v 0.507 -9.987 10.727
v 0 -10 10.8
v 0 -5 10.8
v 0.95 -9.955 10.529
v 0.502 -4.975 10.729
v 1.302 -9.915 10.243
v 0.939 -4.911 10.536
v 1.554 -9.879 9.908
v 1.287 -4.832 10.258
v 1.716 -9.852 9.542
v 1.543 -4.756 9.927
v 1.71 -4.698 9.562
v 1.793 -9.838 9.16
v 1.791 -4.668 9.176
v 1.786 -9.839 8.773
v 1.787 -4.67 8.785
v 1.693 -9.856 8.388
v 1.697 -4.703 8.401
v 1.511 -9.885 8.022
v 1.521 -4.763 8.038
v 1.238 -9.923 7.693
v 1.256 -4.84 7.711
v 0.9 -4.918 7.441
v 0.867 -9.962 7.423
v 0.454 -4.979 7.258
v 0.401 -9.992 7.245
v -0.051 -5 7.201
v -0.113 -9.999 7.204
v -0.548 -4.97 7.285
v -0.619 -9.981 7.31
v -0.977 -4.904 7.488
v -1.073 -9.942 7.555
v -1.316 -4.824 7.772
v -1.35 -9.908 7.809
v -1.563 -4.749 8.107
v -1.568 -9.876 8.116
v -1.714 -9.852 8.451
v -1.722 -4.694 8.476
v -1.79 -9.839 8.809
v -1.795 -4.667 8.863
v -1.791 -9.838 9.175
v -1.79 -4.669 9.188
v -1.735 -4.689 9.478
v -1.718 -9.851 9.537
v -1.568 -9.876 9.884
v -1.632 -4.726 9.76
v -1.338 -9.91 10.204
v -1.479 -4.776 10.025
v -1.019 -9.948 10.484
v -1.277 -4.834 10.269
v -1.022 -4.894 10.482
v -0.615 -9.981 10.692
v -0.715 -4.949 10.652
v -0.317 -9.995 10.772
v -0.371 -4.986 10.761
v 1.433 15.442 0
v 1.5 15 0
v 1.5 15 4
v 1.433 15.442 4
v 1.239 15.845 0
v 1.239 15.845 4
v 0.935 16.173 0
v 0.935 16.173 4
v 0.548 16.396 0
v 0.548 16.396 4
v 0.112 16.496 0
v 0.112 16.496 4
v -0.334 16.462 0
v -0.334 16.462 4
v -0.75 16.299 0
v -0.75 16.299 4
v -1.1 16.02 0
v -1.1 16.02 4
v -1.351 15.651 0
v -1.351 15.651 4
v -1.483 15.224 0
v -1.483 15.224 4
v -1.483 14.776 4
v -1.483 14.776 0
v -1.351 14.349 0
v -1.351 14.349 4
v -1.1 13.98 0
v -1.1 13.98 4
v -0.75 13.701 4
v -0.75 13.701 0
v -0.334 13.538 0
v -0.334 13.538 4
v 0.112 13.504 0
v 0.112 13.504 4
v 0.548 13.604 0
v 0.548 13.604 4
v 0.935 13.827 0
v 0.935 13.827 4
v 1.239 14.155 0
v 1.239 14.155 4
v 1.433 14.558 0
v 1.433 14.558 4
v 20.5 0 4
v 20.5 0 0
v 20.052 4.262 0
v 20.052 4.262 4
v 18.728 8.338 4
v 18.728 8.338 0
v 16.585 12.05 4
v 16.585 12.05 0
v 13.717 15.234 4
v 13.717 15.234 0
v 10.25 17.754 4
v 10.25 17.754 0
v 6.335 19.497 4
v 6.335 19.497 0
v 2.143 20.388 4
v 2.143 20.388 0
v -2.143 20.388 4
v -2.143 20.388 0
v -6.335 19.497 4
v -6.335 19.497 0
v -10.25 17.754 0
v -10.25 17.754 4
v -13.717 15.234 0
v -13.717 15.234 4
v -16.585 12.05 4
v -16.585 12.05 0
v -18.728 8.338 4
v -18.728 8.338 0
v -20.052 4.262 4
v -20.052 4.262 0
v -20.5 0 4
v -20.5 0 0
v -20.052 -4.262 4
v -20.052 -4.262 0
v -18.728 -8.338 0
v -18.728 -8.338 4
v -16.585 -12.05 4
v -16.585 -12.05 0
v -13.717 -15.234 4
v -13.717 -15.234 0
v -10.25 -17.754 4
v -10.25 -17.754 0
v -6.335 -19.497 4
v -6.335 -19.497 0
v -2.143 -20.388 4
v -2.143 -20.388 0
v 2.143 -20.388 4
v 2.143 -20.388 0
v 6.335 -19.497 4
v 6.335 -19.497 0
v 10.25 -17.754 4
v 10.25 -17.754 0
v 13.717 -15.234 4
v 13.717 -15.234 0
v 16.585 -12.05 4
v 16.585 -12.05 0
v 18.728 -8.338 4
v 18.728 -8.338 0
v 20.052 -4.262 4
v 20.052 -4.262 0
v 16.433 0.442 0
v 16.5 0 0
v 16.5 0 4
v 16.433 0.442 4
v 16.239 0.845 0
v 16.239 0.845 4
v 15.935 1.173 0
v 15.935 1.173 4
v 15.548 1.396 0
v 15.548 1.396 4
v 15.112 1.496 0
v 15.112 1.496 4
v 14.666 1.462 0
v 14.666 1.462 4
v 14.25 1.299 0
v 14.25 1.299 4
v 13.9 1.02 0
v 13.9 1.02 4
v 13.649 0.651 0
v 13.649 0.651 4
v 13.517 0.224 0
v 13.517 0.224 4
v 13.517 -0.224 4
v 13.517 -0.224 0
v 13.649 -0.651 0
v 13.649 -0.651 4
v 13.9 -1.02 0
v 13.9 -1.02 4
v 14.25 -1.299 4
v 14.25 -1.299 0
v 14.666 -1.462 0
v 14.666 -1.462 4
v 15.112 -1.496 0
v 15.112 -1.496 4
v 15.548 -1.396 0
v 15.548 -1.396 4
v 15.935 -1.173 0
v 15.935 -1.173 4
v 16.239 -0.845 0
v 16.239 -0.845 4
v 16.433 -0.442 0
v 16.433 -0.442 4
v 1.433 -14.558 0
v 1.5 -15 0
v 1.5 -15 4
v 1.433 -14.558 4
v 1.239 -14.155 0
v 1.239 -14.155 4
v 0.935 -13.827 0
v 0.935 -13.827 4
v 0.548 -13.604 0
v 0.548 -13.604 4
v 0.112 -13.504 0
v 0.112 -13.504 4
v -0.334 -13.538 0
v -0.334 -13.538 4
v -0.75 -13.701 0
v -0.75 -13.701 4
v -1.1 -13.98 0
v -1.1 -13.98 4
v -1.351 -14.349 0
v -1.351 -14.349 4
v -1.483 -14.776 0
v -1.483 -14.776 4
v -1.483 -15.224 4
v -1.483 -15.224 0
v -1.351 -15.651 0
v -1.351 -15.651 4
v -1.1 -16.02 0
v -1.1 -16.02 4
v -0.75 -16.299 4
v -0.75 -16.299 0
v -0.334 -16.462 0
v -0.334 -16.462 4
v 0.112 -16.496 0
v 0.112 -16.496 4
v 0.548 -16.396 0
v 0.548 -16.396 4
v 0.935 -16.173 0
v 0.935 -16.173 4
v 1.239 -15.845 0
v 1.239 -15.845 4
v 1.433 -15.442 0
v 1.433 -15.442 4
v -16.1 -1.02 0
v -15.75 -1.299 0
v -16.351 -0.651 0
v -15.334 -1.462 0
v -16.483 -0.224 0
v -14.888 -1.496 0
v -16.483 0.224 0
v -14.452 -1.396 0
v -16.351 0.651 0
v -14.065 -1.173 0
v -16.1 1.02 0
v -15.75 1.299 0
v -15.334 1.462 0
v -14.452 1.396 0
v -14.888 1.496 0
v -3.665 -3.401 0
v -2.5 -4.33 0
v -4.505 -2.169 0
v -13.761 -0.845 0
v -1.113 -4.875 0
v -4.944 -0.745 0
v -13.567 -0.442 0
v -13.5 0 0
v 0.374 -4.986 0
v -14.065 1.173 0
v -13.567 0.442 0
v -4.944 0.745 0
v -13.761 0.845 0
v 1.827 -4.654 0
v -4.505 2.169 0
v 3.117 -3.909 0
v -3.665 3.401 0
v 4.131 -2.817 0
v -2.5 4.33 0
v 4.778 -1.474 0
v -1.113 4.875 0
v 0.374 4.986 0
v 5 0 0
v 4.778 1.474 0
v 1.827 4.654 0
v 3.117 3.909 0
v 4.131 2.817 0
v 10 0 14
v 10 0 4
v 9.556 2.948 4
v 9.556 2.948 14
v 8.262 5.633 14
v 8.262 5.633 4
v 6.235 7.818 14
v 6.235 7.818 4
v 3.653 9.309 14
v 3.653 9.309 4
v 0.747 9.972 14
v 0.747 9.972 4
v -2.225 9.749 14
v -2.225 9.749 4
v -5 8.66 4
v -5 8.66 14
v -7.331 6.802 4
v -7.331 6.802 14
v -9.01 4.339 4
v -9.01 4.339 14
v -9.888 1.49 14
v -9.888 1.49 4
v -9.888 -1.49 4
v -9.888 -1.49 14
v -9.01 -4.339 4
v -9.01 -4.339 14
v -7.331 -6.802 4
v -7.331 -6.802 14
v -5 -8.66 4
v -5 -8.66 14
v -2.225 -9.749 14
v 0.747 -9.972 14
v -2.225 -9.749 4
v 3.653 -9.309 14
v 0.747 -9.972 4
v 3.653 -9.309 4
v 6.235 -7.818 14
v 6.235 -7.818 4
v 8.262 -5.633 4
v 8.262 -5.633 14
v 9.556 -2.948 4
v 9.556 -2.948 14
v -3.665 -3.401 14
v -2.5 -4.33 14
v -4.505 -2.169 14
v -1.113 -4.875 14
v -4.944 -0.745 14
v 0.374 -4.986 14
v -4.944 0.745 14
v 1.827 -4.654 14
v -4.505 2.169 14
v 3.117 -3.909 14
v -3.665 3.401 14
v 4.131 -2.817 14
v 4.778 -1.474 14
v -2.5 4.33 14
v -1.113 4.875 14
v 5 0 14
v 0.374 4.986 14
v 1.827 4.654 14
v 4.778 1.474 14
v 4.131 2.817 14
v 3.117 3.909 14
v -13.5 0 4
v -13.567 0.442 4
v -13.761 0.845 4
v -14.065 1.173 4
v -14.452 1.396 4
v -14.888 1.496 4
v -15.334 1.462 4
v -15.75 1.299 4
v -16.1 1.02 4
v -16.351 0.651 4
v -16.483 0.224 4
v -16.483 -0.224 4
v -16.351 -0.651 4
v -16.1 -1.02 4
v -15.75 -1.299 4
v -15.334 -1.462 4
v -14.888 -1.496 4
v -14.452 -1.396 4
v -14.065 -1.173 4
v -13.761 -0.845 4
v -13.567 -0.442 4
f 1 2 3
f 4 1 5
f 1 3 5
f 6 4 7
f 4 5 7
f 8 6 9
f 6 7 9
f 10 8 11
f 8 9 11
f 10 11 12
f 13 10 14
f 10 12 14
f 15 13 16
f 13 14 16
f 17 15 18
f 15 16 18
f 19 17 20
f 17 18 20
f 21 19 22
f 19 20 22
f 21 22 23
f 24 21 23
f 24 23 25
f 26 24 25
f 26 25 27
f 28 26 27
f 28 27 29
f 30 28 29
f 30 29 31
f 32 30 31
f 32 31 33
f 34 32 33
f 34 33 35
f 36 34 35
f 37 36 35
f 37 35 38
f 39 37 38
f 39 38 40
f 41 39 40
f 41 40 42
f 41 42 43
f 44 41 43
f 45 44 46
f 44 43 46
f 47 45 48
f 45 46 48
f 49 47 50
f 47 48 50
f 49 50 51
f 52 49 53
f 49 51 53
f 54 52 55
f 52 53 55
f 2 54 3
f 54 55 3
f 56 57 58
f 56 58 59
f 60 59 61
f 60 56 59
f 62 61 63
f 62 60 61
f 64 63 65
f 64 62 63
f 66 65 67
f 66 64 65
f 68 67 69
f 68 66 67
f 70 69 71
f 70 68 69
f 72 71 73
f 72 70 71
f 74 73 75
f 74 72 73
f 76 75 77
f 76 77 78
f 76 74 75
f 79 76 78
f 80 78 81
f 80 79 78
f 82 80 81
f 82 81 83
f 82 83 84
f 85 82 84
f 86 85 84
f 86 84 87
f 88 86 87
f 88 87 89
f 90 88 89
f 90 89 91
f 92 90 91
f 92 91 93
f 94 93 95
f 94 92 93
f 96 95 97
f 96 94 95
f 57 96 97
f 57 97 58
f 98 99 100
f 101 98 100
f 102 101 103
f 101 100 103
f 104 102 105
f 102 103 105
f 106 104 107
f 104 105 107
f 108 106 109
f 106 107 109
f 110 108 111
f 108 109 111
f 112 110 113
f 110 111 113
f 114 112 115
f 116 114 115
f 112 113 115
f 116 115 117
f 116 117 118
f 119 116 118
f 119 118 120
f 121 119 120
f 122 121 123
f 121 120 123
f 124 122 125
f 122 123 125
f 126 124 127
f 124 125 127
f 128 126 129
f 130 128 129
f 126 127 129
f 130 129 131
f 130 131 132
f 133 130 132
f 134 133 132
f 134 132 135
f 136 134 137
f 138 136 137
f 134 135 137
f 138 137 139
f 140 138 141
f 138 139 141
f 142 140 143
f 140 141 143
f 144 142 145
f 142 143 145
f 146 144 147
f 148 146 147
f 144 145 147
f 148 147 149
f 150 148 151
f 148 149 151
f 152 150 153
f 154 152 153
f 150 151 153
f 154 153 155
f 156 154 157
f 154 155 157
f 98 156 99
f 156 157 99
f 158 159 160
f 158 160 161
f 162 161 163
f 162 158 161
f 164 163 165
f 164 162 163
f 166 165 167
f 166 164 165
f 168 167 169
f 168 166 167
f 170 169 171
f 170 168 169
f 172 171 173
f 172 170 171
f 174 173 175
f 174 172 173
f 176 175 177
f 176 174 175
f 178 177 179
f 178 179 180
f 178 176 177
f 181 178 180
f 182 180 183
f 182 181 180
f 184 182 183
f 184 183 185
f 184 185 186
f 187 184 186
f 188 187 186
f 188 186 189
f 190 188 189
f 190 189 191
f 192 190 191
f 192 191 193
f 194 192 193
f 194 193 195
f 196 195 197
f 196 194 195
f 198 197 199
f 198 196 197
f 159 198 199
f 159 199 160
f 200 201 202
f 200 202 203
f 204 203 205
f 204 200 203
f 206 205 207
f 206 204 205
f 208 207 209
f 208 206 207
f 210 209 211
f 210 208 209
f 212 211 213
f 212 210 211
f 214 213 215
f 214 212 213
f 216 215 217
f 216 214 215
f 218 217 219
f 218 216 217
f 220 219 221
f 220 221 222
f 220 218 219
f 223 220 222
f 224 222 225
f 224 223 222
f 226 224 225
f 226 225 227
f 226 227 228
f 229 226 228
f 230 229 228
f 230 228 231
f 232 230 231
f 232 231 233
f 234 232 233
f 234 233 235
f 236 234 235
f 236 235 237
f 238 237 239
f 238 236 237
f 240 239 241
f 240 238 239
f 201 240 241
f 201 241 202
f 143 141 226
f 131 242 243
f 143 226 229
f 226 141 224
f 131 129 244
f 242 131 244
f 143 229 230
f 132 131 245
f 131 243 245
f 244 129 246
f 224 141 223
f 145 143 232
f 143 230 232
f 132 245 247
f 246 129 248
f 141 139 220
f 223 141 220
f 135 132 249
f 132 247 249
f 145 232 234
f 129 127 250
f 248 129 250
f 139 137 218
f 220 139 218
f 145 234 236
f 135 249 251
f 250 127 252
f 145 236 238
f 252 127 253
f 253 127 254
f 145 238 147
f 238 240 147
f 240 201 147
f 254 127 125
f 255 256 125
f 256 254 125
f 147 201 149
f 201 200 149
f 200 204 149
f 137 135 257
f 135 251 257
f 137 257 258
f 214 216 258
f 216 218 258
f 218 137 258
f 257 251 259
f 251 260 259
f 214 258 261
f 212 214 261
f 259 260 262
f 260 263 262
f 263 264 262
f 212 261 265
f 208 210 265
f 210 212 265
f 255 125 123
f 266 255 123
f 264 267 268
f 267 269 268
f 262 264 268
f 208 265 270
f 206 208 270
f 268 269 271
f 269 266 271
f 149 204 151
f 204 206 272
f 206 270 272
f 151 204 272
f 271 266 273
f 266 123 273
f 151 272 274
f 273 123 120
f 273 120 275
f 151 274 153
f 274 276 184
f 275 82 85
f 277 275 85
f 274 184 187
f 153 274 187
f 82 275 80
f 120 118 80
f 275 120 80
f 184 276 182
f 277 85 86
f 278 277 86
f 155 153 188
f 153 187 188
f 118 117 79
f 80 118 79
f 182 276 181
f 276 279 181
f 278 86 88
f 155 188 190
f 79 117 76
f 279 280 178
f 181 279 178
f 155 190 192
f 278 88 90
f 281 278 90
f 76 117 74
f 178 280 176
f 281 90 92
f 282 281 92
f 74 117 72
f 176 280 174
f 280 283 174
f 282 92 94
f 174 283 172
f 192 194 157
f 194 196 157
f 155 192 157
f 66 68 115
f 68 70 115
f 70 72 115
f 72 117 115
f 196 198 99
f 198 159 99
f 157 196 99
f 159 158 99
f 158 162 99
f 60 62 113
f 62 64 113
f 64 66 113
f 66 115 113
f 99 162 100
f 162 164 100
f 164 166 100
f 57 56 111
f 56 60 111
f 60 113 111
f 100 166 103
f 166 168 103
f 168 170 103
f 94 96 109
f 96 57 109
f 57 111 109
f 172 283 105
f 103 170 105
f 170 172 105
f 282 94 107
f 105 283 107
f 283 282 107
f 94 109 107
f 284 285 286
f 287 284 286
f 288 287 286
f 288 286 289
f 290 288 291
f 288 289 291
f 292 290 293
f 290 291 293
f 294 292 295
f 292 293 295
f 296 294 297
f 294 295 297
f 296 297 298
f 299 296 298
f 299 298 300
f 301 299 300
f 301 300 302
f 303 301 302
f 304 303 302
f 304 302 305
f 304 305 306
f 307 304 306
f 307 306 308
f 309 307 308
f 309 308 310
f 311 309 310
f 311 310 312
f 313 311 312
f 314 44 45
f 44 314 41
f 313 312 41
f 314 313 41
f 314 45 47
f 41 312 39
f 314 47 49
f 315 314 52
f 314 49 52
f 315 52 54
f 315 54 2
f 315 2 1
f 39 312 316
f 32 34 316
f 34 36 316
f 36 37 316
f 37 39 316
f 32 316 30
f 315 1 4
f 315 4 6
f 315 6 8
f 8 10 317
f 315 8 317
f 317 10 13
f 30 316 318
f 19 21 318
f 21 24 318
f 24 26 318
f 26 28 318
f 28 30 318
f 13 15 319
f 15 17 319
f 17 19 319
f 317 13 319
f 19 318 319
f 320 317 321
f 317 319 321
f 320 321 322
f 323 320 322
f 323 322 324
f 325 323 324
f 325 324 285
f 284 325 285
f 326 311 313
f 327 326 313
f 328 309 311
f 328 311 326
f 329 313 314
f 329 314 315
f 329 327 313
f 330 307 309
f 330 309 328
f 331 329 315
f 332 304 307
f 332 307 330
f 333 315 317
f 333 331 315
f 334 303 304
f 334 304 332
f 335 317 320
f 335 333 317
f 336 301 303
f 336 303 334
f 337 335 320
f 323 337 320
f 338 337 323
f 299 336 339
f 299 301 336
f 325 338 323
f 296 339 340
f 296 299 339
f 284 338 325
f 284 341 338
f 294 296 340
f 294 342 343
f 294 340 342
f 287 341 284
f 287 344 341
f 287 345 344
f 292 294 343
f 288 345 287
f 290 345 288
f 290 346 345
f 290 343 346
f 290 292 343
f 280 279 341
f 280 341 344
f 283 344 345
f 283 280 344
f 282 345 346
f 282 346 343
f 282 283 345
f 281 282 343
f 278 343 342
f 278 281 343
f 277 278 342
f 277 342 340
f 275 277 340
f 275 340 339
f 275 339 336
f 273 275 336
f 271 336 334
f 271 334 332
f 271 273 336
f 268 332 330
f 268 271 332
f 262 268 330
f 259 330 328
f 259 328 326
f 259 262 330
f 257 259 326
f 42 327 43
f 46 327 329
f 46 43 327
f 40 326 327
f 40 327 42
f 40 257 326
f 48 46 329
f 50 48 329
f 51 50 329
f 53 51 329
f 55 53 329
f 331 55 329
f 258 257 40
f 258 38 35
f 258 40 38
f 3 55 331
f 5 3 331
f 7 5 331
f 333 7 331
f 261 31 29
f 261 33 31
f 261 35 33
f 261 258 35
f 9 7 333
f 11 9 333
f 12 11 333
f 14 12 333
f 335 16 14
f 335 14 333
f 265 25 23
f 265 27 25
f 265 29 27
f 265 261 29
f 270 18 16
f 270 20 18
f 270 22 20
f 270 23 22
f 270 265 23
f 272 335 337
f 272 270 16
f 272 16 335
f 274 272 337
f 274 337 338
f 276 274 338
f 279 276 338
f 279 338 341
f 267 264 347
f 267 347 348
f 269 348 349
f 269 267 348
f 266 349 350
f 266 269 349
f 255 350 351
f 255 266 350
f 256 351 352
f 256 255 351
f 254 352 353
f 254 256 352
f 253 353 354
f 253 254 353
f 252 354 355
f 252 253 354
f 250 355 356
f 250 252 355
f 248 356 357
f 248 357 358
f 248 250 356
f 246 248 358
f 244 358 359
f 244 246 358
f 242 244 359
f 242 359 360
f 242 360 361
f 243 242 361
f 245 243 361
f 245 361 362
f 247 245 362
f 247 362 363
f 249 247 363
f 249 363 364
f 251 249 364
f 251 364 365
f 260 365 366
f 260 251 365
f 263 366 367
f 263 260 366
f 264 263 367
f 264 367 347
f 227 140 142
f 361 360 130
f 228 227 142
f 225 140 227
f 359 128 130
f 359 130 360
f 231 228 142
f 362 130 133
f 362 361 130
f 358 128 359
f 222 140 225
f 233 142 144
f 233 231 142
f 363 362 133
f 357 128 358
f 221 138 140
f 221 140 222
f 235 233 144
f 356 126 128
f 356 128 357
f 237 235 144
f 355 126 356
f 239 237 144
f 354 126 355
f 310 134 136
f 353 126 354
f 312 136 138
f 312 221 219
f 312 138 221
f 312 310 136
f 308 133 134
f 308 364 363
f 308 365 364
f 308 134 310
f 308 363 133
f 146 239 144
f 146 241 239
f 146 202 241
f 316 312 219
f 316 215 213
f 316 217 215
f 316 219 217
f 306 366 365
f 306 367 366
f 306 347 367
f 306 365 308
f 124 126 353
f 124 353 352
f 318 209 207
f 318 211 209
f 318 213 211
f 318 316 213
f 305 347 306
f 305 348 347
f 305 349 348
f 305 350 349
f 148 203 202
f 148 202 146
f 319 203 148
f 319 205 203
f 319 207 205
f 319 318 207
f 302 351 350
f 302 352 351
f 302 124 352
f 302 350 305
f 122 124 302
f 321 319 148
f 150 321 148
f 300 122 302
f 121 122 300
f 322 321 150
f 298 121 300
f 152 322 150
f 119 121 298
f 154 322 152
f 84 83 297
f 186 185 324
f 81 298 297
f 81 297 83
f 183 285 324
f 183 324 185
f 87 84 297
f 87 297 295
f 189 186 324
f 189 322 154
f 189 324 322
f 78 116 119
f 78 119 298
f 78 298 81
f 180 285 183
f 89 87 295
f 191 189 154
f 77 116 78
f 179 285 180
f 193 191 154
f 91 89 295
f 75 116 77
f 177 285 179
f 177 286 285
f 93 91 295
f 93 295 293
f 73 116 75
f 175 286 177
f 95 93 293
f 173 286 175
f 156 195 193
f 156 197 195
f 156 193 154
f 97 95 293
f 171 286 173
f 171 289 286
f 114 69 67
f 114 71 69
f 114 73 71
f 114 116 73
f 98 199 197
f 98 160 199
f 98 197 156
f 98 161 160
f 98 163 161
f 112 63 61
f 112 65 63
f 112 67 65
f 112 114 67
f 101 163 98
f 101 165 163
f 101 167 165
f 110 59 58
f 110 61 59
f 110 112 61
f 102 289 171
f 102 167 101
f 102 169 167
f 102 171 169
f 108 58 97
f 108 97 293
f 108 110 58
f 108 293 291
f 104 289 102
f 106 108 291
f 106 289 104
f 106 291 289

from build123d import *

# Parameters (mm, degrees)
EXTRUDE_1_DEPTH     = 4
SKETCH_2_R          = 10
SKETCH_2_R_2        = 5
EXTRUDE_2_DEPTH     = 10
SKETCH_3_R          = 1.8
CUT_EXTRUDE_1_DEPTH = 13


with BuildPart() as part:
    # 草图1 → 凸台-拉伸1 (new body)
    with BuildSketch(Plane.XY):
        with BuildLine():
            ThreePointArc((-20.5, 0), (0, -20.5), (20.5, 0))
            ThreePointArc((20.5, 0), (0, 20.5), (-20.5, 0))
        make_face()
        with BuildLine():
            ThreePointArc((-16.5, 0), (-15, -1.5), (-13.5, 0))
            ThreePointArc((-13.5, 0), (-15, 1.5), (-16.5, 0))
        make_face(mode=Mode.SUBTRACT)
        with BuildLine():
            ThreePointArc((-1.5, -15), (0, -16.5), (1.5, -15))
            ThreePointArc((1.5, -15), (0, -13.5), (-1.5, -15))
        make_face(mode=Mode.SUBTRACT)
        with BuildLine():
            ThreePointArc((13.5, 0), (15, -1.5), (16.5, 0))
            ThreePointArc((16.5, 0), (15, 1.5), (13.5, 0))
        make_face(mode=Mode.SUBTRACT)
        with BuildLine():
            ThreePointArc((-1.5, 15), (0, 13.5), (1.5, 15))
            ThreePointArc((1.5, 15), (0, 16.5), (-1.5, 15))
        make_face(mode=Mode.SUBTRACT)
        with BuildLine():
            ThreePointArc((-5, 0), (0, -5), (5, 0))
            ThreePointArc((5, 0), (0, 5), (-5, 0))
        make_face(mode=Mode.SUBTRACT)
    extrude(amount=EXTRUDE_1_DEPTH)

    # 草图2 → 凸台-拉伸2 (add)
    with BuildSketch(Plane.XY.offset(4)):
        Circle(SKETCH_2_R)
        Circle(SKETCH_2_R_2, mode=Mode.SUBTRACT)
    extrude(amount=EXTRUDE_2_DEPTH)

    # 草图3 → 切除-拉伸1 (cut)
    with BuildSketch(Plane(origin=(0, 0, 0), x_dir=(1, 0, 0), z_dir=(0, 1, 0))):
        with Locations(Location((0, -9, 0), (0, 0, 270))):
            Circle(SKETCH_3_R)
    extrude(amount=-CUT_EXTRUDE_1_DEPTH, mode=Mode.SUBTRACT)


solid = part.part
